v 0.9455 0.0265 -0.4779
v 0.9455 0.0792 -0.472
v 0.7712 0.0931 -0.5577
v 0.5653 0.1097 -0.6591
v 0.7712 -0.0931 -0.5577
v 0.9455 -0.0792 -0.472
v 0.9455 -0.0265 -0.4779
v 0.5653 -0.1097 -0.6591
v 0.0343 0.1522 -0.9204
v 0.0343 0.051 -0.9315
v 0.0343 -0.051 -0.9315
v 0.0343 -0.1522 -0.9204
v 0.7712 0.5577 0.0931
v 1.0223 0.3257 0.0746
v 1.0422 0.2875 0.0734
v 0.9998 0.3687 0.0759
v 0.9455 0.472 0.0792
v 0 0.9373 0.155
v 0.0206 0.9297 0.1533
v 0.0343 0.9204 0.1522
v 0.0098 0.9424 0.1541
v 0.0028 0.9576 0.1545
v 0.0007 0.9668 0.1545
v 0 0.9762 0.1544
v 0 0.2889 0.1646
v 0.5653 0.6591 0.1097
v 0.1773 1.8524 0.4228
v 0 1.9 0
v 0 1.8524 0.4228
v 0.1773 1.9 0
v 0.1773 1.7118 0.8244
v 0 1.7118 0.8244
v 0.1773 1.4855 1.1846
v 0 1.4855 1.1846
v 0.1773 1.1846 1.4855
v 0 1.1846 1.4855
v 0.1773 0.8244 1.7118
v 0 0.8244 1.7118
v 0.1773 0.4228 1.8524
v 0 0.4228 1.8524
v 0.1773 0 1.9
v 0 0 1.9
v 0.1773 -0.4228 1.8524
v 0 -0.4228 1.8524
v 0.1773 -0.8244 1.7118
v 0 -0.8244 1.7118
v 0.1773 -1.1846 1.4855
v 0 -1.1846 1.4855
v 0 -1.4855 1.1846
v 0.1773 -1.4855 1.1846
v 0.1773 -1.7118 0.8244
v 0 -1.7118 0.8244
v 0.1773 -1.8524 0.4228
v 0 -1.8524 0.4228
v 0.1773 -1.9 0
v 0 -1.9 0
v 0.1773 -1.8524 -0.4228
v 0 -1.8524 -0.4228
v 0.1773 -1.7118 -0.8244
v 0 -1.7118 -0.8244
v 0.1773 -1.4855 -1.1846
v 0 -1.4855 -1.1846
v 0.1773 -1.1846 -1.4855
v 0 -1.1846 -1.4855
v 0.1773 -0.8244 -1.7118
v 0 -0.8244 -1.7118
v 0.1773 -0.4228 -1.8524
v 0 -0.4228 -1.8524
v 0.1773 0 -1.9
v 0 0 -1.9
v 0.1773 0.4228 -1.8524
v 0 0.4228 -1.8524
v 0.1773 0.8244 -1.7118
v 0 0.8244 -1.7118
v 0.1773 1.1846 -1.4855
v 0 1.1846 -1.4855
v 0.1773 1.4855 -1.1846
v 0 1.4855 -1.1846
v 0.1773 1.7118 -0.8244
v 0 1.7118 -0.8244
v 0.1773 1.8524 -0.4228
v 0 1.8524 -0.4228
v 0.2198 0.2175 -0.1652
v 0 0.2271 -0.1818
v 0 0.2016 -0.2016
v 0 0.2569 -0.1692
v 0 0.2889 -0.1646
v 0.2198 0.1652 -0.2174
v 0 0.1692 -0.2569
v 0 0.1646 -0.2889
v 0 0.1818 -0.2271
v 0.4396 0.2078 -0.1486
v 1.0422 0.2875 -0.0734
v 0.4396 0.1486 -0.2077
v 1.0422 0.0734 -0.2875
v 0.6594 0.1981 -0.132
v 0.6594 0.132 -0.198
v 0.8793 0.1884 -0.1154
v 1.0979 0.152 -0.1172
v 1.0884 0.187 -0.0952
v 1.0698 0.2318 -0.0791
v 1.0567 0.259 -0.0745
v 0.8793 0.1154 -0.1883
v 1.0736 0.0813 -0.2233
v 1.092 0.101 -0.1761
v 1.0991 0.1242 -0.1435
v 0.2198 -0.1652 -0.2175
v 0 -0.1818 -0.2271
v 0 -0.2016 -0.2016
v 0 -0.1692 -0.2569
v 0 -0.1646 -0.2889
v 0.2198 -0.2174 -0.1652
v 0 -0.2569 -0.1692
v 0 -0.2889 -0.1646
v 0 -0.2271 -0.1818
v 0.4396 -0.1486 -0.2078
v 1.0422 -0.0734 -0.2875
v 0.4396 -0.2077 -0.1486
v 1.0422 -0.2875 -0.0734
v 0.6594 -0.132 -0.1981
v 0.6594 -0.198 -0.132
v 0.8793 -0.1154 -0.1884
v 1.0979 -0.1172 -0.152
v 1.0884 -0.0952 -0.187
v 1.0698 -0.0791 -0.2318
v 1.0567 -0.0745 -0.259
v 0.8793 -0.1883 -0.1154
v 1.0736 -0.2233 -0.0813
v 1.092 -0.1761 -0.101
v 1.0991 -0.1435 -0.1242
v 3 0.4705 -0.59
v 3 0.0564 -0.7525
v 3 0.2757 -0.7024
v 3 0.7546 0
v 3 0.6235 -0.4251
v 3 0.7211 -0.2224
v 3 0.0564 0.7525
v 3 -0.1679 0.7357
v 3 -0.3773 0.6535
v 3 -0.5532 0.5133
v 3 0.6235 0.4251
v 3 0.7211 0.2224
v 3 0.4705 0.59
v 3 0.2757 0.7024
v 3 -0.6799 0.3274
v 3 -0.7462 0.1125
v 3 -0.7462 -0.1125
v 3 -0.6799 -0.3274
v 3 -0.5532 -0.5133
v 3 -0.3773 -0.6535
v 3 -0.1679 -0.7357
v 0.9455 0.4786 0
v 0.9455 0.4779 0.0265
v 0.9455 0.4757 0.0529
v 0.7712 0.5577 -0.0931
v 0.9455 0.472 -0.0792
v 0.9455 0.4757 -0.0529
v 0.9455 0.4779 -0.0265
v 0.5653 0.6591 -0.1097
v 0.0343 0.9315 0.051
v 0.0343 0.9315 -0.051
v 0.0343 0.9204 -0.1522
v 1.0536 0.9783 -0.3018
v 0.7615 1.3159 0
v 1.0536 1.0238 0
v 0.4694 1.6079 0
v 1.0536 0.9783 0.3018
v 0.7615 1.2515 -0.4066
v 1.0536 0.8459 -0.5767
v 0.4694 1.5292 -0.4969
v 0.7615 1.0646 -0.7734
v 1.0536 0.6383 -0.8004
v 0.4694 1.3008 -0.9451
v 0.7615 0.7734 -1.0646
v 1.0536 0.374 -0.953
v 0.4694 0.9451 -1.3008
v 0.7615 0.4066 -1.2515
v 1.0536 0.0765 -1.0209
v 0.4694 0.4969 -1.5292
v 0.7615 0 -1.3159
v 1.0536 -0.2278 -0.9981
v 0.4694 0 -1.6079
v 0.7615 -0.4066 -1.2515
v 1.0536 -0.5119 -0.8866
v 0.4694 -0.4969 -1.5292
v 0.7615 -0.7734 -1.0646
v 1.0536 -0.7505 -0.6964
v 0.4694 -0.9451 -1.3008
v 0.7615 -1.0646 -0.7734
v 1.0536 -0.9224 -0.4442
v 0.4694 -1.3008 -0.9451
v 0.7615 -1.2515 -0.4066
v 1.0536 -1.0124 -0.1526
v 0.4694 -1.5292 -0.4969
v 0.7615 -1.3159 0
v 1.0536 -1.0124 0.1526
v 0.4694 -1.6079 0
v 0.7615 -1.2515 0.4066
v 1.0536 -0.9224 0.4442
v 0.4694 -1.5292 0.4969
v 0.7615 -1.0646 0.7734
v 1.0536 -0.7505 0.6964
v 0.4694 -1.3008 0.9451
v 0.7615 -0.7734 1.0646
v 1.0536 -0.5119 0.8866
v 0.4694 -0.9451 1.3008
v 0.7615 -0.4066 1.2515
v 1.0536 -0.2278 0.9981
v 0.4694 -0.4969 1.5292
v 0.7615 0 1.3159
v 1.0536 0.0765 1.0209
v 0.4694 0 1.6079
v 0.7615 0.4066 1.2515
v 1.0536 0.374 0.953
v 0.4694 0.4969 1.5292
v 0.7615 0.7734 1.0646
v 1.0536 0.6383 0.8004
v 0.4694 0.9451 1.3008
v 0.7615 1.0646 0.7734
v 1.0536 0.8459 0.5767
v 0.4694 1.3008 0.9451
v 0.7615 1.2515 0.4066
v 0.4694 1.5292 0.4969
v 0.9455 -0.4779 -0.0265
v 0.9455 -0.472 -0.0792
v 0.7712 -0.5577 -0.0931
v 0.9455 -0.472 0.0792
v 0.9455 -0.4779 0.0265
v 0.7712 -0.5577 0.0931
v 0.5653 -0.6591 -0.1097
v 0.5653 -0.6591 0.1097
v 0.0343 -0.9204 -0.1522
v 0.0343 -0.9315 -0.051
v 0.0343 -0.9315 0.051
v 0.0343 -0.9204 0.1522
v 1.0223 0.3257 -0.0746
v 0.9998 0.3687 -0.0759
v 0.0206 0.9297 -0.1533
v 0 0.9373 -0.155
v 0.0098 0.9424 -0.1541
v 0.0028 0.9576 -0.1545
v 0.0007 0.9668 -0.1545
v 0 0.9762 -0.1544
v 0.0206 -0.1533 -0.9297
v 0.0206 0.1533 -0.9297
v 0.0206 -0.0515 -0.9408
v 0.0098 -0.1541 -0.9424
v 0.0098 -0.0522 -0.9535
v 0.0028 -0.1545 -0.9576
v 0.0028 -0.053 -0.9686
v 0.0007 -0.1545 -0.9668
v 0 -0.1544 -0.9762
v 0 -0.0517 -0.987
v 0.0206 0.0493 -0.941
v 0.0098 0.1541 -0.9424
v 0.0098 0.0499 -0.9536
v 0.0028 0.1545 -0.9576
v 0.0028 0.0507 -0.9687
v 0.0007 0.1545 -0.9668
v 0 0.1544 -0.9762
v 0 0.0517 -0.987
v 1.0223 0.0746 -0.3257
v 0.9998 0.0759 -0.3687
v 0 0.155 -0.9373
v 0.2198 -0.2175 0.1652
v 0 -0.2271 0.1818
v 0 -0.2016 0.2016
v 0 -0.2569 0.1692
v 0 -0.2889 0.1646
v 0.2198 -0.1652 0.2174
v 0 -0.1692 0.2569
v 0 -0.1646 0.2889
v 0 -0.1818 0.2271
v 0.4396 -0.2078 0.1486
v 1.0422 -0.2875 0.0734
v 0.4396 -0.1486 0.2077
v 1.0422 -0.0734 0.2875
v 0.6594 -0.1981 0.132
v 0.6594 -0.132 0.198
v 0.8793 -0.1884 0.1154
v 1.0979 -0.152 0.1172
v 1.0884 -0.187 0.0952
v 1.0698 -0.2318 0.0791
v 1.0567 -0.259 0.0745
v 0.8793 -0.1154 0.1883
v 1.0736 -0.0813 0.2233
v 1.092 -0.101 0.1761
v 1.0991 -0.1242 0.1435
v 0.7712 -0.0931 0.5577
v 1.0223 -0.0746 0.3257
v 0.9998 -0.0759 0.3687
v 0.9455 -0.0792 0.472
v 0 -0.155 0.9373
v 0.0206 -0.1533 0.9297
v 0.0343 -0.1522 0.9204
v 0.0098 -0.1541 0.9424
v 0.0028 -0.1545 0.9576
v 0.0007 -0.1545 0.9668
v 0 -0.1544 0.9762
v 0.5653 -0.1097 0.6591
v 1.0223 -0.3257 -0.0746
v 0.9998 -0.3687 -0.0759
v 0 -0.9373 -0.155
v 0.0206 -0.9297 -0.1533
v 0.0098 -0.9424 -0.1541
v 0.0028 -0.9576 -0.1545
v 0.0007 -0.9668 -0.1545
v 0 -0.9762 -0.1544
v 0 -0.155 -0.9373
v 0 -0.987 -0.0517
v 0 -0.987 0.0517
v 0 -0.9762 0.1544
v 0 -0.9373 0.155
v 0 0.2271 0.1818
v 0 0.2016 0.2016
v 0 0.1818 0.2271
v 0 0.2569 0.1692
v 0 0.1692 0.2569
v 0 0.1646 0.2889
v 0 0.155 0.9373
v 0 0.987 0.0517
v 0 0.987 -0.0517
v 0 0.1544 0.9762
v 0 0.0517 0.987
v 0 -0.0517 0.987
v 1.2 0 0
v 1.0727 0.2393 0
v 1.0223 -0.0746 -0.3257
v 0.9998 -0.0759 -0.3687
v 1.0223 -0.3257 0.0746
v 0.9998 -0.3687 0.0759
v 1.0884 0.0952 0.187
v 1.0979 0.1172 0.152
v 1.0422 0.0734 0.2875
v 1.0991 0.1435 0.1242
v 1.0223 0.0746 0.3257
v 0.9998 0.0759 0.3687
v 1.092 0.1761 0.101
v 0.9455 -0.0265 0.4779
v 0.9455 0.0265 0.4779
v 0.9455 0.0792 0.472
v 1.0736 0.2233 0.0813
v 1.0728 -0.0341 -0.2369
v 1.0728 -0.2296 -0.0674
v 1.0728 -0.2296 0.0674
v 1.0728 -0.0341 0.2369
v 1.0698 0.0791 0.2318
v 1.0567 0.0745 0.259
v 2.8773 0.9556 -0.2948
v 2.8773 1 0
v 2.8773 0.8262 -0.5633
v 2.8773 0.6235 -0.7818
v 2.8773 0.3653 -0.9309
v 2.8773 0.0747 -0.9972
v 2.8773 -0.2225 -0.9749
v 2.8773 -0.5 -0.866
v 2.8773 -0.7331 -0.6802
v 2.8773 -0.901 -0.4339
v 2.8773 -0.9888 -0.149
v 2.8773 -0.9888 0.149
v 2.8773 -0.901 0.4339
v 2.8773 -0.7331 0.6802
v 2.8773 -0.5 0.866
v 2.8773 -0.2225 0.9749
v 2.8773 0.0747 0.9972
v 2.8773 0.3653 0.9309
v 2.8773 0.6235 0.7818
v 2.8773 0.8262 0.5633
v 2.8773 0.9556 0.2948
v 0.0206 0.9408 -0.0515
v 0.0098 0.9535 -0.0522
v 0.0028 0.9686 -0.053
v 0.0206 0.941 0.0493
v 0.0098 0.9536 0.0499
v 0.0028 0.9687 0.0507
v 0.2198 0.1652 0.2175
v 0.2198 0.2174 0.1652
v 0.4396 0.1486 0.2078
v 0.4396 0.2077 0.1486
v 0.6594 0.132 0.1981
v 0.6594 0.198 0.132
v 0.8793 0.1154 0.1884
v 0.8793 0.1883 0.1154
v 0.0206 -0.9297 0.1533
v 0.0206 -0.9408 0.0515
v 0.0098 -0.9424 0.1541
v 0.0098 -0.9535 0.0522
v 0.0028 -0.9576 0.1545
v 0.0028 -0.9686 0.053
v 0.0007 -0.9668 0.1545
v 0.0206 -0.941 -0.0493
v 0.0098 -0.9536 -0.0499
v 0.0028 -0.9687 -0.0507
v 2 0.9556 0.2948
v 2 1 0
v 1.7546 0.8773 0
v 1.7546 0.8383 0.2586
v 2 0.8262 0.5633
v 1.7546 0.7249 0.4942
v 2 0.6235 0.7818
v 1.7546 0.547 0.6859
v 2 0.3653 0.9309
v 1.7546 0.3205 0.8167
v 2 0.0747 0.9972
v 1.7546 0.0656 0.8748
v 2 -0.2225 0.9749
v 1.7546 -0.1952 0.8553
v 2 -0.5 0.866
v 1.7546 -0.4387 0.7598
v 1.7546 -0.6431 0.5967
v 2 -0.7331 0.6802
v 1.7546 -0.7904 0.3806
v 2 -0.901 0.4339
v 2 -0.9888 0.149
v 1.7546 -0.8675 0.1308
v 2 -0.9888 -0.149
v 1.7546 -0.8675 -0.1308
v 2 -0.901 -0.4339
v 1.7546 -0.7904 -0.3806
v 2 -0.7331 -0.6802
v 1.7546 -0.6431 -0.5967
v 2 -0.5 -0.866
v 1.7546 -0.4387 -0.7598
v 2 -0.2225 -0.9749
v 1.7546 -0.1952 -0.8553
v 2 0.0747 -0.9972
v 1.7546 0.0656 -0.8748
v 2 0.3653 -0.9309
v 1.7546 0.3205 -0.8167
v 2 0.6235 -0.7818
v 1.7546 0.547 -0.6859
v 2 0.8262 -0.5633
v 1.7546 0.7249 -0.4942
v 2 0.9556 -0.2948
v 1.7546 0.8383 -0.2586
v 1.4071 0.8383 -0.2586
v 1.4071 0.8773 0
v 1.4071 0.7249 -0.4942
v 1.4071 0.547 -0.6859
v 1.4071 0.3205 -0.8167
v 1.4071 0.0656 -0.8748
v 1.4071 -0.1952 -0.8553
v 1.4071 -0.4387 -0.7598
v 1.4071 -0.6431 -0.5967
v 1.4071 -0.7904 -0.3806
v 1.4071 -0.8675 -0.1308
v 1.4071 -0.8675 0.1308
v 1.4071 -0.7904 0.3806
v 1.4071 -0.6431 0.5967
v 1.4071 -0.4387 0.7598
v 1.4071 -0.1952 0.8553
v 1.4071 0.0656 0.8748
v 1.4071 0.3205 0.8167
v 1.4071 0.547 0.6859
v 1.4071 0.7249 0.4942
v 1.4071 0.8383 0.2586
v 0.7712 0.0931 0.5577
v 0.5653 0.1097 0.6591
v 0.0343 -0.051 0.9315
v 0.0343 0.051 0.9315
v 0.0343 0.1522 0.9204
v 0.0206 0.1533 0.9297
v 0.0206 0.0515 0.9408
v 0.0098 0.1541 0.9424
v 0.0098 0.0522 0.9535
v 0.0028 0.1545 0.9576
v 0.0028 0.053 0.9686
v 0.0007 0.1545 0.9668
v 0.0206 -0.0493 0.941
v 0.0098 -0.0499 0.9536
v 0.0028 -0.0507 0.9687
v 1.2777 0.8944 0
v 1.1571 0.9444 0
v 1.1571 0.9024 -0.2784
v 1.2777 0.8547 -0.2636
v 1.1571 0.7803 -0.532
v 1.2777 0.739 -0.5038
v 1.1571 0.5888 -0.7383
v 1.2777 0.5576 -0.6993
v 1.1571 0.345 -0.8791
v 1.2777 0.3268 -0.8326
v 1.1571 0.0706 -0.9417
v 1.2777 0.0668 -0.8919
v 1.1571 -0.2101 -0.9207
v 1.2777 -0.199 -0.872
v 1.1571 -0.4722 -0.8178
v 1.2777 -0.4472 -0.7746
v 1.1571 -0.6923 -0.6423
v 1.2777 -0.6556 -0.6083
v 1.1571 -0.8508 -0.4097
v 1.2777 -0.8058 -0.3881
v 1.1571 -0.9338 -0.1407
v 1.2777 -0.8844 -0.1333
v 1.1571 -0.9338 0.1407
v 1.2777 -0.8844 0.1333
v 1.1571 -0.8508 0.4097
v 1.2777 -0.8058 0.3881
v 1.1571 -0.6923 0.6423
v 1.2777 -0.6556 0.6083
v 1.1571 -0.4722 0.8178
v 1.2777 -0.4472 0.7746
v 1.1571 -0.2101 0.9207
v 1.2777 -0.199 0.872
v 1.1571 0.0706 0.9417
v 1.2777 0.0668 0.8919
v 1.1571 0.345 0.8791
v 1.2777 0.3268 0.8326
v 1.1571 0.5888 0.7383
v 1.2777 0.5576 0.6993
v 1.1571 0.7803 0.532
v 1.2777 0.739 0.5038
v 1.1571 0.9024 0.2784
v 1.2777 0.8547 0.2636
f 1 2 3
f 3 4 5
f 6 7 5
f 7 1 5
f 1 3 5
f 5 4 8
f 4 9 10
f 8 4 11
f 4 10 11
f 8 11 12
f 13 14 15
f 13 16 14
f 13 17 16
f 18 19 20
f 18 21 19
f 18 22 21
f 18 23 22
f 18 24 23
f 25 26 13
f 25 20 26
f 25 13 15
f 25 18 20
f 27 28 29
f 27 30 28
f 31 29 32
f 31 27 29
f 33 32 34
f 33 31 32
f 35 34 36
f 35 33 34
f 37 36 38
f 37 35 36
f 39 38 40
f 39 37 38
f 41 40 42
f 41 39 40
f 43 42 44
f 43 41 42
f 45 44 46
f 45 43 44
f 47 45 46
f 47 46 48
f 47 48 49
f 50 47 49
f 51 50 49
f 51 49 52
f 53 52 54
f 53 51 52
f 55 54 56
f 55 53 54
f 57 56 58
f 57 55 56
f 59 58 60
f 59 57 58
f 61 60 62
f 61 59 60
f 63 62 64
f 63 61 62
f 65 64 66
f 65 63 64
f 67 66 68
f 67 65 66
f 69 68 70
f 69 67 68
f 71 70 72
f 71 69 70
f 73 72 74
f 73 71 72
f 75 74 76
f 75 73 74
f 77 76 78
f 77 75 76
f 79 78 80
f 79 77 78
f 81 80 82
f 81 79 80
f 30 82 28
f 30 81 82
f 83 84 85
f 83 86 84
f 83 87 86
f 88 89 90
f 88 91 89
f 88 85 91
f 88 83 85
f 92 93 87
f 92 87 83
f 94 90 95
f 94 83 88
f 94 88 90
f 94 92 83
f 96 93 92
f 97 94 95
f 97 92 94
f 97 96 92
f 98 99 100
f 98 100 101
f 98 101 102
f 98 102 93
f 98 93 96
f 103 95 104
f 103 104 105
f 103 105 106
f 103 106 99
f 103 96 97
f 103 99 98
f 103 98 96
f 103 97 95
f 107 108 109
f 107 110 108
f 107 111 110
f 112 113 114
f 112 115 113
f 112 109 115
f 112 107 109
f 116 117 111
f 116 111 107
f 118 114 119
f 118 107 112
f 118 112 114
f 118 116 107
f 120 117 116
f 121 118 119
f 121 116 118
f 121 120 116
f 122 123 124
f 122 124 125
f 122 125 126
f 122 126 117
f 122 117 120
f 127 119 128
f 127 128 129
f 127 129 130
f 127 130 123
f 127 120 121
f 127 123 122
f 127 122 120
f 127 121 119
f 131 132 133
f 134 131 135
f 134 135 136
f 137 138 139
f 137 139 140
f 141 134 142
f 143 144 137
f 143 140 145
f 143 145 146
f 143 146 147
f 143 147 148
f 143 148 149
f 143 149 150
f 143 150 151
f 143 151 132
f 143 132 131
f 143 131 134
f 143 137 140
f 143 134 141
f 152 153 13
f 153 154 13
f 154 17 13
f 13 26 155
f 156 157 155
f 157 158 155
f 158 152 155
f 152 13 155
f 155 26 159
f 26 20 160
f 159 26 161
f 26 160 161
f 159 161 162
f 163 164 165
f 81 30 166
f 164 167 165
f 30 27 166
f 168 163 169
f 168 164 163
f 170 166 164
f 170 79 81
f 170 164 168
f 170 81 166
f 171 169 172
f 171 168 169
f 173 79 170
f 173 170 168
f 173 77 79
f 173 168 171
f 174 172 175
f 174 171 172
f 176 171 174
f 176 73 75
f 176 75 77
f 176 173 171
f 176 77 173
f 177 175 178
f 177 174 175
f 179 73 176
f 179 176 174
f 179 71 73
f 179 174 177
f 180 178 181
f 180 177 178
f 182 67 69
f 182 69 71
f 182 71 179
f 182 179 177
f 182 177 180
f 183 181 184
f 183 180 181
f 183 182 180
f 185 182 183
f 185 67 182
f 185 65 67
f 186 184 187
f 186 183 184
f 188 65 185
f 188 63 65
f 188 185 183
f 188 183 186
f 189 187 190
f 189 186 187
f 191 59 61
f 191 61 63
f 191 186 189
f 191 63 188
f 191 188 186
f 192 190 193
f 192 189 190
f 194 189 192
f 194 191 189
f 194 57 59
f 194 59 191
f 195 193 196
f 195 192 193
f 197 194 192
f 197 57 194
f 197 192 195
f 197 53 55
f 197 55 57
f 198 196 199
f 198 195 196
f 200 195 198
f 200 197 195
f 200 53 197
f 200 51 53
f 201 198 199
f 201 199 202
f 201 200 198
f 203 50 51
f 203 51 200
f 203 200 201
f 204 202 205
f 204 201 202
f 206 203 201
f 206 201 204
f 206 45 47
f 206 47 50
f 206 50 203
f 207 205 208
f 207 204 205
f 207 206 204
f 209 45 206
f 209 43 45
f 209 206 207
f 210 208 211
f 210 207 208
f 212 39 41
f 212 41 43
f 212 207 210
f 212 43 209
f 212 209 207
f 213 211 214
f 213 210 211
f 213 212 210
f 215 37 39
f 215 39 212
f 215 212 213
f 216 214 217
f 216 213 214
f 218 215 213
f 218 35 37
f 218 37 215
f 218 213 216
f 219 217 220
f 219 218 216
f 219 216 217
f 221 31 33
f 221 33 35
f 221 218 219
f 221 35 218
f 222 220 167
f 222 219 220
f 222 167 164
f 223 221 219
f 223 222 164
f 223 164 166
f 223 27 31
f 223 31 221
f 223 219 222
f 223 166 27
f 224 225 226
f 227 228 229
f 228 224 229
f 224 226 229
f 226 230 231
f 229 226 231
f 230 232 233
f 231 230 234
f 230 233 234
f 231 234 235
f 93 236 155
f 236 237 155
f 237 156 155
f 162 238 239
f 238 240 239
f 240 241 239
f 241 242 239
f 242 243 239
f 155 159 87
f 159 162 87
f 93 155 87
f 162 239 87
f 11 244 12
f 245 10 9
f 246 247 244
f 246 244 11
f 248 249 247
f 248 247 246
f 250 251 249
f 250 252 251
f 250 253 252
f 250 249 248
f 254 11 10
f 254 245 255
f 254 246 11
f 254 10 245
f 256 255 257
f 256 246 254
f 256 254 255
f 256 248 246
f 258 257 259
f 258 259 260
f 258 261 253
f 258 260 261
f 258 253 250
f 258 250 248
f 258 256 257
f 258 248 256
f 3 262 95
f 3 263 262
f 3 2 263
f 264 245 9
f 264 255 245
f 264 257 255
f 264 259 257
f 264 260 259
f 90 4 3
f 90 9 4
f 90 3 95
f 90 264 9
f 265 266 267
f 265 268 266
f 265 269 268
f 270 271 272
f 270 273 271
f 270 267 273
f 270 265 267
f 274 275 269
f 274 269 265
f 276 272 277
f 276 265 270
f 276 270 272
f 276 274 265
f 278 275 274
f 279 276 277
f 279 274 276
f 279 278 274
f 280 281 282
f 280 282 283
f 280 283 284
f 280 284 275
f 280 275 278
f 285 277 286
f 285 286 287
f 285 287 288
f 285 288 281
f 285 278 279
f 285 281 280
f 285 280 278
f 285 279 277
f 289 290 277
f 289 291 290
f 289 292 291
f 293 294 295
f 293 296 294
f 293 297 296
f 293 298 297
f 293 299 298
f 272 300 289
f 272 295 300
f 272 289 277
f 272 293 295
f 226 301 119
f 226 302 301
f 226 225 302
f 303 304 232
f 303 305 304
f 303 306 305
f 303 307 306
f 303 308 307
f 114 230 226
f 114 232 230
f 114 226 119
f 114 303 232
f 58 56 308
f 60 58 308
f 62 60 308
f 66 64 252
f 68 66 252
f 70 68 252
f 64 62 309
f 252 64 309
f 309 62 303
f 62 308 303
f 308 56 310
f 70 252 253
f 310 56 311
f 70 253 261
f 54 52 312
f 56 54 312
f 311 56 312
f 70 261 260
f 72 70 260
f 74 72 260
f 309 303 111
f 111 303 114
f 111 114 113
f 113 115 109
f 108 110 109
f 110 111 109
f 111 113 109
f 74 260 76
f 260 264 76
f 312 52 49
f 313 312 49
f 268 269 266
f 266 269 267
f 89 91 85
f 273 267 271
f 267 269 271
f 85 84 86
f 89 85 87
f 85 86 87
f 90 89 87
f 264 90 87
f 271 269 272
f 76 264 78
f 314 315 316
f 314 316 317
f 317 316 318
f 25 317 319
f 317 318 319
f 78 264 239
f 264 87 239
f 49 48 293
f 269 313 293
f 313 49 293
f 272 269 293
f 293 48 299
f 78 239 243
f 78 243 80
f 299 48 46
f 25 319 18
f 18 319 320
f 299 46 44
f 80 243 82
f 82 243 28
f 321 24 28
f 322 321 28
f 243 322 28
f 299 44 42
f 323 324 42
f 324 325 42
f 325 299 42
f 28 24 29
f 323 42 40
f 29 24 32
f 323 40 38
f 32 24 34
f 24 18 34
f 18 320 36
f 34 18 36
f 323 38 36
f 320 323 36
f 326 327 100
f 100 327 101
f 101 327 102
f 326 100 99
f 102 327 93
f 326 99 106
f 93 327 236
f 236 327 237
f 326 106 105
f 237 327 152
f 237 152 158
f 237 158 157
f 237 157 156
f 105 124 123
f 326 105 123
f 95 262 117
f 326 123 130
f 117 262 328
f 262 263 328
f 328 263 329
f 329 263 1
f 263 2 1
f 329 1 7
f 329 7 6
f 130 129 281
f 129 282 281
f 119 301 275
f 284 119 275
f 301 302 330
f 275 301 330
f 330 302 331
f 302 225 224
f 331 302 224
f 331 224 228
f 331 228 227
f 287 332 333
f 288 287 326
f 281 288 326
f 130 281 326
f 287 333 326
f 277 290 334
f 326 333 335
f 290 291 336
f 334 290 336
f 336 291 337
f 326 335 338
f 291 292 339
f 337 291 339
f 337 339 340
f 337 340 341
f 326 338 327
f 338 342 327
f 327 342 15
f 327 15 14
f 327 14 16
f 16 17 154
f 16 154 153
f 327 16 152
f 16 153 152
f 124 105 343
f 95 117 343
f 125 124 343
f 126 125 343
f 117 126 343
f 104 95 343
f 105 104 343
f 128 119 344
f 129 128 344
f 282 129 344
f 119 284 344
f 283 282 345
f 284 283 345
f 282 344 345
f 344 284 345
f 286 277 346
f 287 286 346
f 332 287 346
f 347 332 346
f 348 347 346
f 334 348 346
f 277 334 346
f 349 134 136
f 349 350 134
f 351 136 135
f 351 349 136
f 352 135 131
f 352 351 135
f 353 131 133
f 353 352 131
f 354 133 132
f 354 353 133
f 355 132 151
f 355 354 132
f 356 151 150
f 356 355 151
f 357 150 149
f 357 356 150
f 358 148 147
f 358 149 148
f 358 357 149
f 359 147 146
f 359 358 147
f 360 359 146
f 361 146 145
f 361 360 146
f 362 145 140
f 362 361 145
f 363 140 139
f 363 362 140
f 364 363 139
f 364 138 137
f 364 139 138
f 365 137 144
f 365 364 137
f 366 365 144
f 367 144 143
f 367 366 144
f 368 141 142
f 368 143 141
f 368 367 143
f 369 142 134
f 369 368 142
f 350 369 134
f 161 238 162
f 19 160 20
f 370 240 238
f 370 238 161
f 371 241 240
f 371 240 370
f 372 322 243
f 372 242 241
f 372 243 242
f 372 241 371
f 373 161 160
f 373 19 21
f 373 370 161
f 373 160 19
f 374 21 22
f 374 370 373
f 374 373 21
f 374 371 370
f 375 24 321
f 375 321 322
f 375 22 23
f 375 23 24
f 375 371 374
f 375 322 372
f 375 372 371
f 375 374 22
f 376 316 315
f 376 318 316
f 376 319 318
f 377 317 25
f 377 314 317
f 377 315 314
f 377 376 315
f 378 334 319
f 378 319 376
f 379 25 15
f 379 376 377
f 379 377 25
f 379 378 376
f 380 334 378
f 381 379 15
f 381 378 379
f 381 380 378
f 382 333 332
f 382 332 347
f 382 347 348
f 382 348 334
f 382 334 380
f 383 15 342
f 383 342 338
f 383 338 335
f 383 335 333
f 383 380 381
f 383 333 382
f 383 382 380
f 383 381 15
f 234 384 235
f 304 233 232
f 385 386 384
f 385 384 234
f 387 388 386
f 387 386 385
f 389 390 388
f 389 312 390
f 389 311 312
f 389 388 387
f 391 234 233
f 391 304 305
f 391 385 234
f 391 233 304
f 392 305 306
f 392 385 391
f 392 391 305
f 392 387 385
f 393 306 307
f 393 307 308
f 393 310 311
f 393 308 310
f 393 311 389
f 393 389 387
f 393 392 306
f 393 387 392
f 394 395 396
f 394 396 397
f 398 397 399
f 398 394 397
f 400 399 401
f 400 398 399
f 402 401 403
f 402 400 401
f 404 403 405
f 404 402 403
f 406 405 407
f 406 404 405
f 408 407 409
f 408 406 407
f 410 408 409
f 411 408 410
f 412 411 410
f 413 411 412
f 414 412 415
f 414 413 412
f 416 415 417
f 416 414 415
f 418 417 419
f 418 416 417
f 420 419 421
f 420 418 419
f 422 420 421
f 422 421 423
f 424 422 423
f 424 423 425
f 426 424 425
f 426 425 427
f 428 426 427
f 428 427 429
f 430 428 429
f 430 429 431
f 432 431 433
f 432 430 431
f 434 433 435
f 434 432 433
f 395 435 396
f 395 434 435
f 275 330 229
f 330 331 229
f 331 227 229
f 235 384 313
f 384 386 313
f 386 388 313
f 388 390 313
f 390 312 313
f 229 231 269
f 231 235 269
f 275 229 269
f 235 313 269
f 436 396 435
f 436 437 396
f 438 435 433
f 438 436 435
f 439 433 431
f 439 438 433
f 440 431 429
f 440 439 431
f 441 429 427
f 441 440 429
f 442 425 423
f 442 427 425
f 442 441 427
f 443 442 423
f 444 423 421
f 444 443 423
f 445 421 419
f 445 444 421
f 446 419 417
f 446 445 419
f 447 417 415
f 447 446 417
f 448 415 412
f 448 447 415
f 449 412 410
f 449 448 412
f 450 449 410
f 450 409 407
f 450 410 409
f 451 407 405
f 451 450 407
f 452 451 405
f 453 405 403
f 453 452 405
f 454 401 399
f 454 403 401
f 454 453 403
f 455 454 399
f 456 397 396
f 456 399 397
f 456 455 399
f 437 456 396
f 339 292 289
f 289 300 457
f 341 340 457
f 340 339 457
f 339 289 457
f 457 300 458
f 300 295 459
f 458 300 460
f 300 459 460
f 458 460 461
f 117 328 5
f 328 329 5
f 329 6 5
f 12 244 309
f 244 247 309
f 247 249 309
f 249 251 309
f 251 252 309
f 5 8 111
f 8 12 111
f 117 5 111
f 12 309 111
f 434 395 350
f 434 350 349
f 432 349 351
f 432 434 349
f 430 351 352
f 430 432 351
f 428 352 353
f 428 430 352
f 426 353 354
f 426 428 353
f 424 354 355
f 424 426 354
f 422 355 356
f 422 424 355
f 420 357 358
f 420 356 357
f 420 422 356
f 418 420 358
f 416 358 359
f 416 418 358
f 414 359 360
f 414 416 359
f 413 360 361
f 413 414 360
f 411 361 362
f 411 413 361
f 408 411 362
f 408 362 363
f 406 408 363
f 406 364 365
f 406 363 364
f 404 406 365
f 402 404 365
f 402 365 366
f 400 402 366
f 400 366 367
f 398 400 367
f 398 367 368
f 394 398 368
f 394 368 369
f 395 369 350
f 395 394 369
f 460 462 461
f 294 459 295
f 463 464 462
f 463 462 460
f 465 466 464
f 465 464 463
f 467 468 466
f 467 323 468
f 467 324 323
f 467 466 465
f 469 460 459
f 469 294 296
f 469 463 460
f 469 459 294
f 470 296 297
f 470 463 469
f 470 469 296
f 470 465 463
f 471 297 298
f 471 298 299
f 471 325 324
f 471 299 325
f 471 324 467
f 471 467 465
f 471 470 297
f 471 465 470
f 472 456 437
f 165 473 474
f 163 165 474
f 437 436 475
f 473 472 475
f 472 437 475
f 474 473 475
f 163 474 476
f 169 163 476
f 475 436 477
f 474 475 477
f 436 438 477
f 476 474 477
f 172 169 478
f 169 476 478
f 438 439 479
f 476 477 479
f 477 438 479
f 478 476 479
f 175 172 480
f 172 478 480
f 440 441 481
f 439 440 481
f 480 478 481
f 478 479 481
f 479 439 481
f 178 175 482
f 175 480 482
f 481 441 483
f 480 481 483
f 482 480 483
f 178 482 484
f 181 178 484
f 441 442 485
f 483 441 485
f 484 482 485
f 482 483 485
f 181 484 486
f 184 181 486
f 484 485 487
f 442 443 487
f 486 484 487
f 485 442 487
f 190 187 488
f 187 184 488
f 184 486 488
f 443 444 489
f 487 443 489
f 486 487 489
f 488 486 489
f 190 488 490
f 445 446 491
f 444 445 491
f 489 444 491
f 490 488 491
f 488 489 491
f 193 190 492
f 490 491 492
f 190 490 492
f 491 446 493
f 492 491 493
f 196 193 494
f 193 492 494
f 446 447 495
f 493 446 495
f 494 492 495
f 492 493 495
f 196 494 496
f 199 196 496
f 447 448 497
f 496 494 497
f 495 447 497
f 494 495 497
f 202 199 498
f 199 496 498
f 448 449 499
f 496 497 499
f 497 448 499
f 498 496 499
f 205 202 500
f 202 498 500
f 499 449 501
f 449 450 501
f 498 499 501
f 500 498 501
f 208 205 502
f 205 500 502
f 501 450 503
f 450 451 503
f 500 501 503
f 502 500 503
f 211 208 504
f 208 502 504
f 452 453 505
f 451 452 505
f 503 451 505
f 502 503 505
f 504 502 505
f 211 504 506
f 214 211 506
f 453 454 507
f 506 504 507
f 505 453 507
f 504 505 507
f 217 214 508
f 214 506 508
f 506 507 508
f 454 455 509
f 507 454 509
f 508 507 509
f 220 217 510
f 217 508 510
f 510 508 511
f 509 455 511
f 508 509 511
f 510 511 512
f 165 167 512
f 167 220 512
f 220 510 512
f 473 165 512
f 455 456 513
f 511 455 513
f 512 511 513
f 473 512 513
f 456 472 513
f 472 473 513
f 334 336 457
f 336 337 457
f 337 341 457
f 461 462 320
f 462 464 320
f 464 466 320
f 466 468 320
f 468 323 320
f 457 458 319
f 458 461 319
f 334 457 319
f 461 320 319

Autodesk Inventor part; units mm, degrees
ref_plane "YZ Plane" through (0, 0, 0) normal (1, 0, 0) x (0, 1, 0)
ref_plane "XZ Plane" through (0, 0, 0) normal (0, 1, 0) x (-1, 0, 0)
sketch "Sketch1" plane through (0, 0, 0) normal (0, 0, 1) x (1, 0, 0)
  line L0 (1.2, 0) -> (3, 0)
  line L1 (3, 0) -> (3, 1)
  line L2 (3, 1) -> (2, 1)
  line L3 (2, 1) -> (1.7546, 0.8773)
  line L4 (1.7546, 0.8773) -> (1.4071, 0.8773)
  line L5 (0, 1.9) -> (0, 0.95)
  line L6 (0, 0.95) -> (0.9455, 0.4786)
  line L7 (0.9455, 0.4786) -> (1.2, 0)
  line L8 (-0.6, 0) -> (3.6, 0) projected
  line L9 (0, -0.38) -> (0, 2.28) projected
  line L10 (0, 1.9) -> (0.1773, 1.9)
  line L11 (0.1773, 1.9) -> (1.0536, 1.0238)
  line L12 (2, 1) -> (1.0773, 1) construction
  arc A0 (1.0536, 1.0238) -> (1.4071, 0.8773) centre (1.4071, 1.3773) ccw
  point P0 (1.2, 0.8773)
  dimension "d1" = 1
  dimension "d2" = 2
  dimension "d3" = 1.7546
  dimension "d4" = 1.9
  dimension "d5" = 26.5
  dimension "d6" = 62
  dimension "d7" = 1.2
  dimension "d8" = 0.2454
  dimension "d12" = 3.8
  dimension "d13" = 45
  dimension "d15" = 3
  dimension "d24" = 1.2
  dimension "d93" = 0.5
revolve "Body" add sketch "Sketch1" angle 360 about axis through (1.2, 0, 0) along (1, 0, 0) contours L7 L6 L5 L10 L11 A0 L4 L3 L2 L1 L0
sketch "Sketch2" plane through (0, 0, 0) normal (-1, 0, 0) x (0, 0, 1)
  line L0 (0, 0.95) -> (0, 0) construction
  line L1 (0, 0) -> (0.95, 0) construction
  arc A0 (0.285, 0) -> (0, 0.285) centre (0, 0) ccw construction
  arc A1 (0.3325, 0) -> (0, 0.3325) centre (0, 0) ccw construction
  arc A2 (0.9373, 0.155) -> (0.155, 0.9373) centre (0, 0) ccw
  line L2 (0, 0) -> (0.6718, 0.6718) construction
  line L3 (0.155, 0.9373) -> (0.1646, 0.2889)
  line L4 (0.9373, 0.155) -> (0.2889, 0.1646)
  arc A3 (0.155, 0.9373) -> (0, 0.95) centre (0, 0) ccw
  arc A4 (0.95, 0) -> (0.9373, 0.155) centre (0, 0) ccw
  line L5 (0, -2.66) -> (0, 2.66) projected
  line L6 (-2.66, 0) -> (2.66, 0) projected
  arc A5 (0.155, -0.9373) -> (0.9373, -0.155) centre (0, 0) ccw
  line L7 (0.155, -0.9373) -> (0.1646, -0.2889)
  line L8 (0.9373, -0.155) -> (0.2889, -0.1646)
  arc A6 (0, -0.95) -> (0.155, -0.9373) centre (0, 0) ccw
  arc A7 (0.9373, -0.155) -> (0.95, 0) centre (0, 0) ccw
  arc A8 (-0.155, 0.9373) -> (-0.9373, 0.155) centre (0, 0) ccw
  line L9 (-0.155, 0.9373) -> (-0.1646, 0.2889)
  line L10 (-0.9373, 0.155) -> (-0.2889, 0.1646)
  arc A9 (0, 0.95) -> (-0.155, 0.9373) centre (0, 0) ccw
  arc A10 (-0.9373, 0.155) -> (-0.95, 0) centre (0, 0) ccw
  arc A11 (-0.155, -0.9373) -> (0, -0.95) centre (0, 0) ccw
  arc A12 (-0.9373, -0.155) -> (-0.155, -0.9373) centre (0, 0) ccw
  arc A13 (-0.95, 0) -> (-0.9373, -0.155) centre (0, 0) ccw
  line L11 (-0.9373, -0.155) -> (-0.2889, -0.1646)
  line L12 (-0.155, -0.9373) -> (-0.1646, -0.2889)
  arc A14 (0.1646, 0.2889) -> (0.2889, 0.1646) centre (0.2908, 0.2908) ccw
  arc A15 (0.2889, -0.1646) -> (0.1646, -0.2889) centre (0.2908, -0.2908) ccw
  arc A16 (-0.2889, 0.1646) -> (-0.1646, 0.2889) centre (-0.2908, 0.2908) ccw
  arc A17 (-0.1646, -0.2889) -> (-0.2889, -0.1646) centre (-0.2908, -0.2908) ccw
  point P0 (0.6718, -0.6718)
  point P1 (-0.6718, 0.6718)
  point P2 (-0.6718, -0.6718)
  dimension "d17" = 0.57
  dimension "d18" = 0.665
  dimension "d19" = 1.9
  dimension "d20" = 45
  dimension "d21" = 0.155
extrude "Slot" add sketch "Sketch2" against normal up to next draft 5 contours L4 A14 L3 A2 | A5 L7 A15 L8 | L9 A16 L10 A8 | A12 L11 A17 L12
fillet "Fillet1" radius 0.062 4 edges at (0, 0.95, 0) (0, 0, -0.95) (0, -0.95, 0) (0, 0, 0.95)
thread "Thread" size "M2x0.4" class "6g" standard "ISO Metric profile" length 1
chamfer "Chamfer1" distance 0.2454 distance2 0.1227 1 edges at (3, -1, 0) measured on face at (3, 0.479, -0.3842)
ref_plane "Work Plane2" through (3.35, 0, 0) normal (0, 0, -1) x (1, 0, 0)
equation "\"d1\" = GEL"
equation "\"d2\" = GD"
equation "\"d3\" = BDM"
equation "\"d4\" = SDM"
equation "\"d7\" = INTI"
equation "\"d8\" = GAL"
equation "\"d12\" = KOD"
equation "\"d13\" = 0.5 * SEWI"
equation "\"d15\" = NLG"
equation "\"d24\" = KOH"
equation "\"d93\" = R"
equation "\"d17\" = 0.3 * SDM"
equation "\"d18\" = 0.35 * SDM"
equation "\"d19\" = SDM"
equation "\"d21\" = 0.5 * SBR"
equation "\"d23\" = 0.2 * SBR"
equation "\"d10\" = GEL"
equation "\"d25\" = -0.5 * SPD + 0.5 * GD"
equation "\"d26\" = 0.5 * GAL"
equation "\"NLG\" = 3"
equation "\"GEL\" = 1"
equation "\"GAL\" = 0.61345 * PTC"
equation "\"SPD\" = NND - 1.2269 * PTC"
equation "\"KOD\" = 3.8"
equation "\"KOH\" = 1.2"
equation "\"SBR\" = 0.31"
equation "\"INTI\" = 1.2"
equation "\"SDM\" = 1.9"
equation "\"GD\" = NND"
equation "\"BDM\" = NND - GAL"
equation "\"SEWI\" = 90deg"
equation "\"d9\" = SDM"
equation "\"R\" = 0.5"
equation "\"GUL\" = 0.61345 * PTC"
equation "\"TOA\" = 30deg"
equation "\"EPV\" = 2.2"
equation "\"THREADDIA\" = 2"
equation "\"PTC\" = 0.4"
equation "\"NND\" = 2"
equation "\"GD1\" = THREADDIA - 1.2269 * PTC"
properties part number "ISO 7046-1  - M2 x 3 - 4.8 - H" material "Steel"
